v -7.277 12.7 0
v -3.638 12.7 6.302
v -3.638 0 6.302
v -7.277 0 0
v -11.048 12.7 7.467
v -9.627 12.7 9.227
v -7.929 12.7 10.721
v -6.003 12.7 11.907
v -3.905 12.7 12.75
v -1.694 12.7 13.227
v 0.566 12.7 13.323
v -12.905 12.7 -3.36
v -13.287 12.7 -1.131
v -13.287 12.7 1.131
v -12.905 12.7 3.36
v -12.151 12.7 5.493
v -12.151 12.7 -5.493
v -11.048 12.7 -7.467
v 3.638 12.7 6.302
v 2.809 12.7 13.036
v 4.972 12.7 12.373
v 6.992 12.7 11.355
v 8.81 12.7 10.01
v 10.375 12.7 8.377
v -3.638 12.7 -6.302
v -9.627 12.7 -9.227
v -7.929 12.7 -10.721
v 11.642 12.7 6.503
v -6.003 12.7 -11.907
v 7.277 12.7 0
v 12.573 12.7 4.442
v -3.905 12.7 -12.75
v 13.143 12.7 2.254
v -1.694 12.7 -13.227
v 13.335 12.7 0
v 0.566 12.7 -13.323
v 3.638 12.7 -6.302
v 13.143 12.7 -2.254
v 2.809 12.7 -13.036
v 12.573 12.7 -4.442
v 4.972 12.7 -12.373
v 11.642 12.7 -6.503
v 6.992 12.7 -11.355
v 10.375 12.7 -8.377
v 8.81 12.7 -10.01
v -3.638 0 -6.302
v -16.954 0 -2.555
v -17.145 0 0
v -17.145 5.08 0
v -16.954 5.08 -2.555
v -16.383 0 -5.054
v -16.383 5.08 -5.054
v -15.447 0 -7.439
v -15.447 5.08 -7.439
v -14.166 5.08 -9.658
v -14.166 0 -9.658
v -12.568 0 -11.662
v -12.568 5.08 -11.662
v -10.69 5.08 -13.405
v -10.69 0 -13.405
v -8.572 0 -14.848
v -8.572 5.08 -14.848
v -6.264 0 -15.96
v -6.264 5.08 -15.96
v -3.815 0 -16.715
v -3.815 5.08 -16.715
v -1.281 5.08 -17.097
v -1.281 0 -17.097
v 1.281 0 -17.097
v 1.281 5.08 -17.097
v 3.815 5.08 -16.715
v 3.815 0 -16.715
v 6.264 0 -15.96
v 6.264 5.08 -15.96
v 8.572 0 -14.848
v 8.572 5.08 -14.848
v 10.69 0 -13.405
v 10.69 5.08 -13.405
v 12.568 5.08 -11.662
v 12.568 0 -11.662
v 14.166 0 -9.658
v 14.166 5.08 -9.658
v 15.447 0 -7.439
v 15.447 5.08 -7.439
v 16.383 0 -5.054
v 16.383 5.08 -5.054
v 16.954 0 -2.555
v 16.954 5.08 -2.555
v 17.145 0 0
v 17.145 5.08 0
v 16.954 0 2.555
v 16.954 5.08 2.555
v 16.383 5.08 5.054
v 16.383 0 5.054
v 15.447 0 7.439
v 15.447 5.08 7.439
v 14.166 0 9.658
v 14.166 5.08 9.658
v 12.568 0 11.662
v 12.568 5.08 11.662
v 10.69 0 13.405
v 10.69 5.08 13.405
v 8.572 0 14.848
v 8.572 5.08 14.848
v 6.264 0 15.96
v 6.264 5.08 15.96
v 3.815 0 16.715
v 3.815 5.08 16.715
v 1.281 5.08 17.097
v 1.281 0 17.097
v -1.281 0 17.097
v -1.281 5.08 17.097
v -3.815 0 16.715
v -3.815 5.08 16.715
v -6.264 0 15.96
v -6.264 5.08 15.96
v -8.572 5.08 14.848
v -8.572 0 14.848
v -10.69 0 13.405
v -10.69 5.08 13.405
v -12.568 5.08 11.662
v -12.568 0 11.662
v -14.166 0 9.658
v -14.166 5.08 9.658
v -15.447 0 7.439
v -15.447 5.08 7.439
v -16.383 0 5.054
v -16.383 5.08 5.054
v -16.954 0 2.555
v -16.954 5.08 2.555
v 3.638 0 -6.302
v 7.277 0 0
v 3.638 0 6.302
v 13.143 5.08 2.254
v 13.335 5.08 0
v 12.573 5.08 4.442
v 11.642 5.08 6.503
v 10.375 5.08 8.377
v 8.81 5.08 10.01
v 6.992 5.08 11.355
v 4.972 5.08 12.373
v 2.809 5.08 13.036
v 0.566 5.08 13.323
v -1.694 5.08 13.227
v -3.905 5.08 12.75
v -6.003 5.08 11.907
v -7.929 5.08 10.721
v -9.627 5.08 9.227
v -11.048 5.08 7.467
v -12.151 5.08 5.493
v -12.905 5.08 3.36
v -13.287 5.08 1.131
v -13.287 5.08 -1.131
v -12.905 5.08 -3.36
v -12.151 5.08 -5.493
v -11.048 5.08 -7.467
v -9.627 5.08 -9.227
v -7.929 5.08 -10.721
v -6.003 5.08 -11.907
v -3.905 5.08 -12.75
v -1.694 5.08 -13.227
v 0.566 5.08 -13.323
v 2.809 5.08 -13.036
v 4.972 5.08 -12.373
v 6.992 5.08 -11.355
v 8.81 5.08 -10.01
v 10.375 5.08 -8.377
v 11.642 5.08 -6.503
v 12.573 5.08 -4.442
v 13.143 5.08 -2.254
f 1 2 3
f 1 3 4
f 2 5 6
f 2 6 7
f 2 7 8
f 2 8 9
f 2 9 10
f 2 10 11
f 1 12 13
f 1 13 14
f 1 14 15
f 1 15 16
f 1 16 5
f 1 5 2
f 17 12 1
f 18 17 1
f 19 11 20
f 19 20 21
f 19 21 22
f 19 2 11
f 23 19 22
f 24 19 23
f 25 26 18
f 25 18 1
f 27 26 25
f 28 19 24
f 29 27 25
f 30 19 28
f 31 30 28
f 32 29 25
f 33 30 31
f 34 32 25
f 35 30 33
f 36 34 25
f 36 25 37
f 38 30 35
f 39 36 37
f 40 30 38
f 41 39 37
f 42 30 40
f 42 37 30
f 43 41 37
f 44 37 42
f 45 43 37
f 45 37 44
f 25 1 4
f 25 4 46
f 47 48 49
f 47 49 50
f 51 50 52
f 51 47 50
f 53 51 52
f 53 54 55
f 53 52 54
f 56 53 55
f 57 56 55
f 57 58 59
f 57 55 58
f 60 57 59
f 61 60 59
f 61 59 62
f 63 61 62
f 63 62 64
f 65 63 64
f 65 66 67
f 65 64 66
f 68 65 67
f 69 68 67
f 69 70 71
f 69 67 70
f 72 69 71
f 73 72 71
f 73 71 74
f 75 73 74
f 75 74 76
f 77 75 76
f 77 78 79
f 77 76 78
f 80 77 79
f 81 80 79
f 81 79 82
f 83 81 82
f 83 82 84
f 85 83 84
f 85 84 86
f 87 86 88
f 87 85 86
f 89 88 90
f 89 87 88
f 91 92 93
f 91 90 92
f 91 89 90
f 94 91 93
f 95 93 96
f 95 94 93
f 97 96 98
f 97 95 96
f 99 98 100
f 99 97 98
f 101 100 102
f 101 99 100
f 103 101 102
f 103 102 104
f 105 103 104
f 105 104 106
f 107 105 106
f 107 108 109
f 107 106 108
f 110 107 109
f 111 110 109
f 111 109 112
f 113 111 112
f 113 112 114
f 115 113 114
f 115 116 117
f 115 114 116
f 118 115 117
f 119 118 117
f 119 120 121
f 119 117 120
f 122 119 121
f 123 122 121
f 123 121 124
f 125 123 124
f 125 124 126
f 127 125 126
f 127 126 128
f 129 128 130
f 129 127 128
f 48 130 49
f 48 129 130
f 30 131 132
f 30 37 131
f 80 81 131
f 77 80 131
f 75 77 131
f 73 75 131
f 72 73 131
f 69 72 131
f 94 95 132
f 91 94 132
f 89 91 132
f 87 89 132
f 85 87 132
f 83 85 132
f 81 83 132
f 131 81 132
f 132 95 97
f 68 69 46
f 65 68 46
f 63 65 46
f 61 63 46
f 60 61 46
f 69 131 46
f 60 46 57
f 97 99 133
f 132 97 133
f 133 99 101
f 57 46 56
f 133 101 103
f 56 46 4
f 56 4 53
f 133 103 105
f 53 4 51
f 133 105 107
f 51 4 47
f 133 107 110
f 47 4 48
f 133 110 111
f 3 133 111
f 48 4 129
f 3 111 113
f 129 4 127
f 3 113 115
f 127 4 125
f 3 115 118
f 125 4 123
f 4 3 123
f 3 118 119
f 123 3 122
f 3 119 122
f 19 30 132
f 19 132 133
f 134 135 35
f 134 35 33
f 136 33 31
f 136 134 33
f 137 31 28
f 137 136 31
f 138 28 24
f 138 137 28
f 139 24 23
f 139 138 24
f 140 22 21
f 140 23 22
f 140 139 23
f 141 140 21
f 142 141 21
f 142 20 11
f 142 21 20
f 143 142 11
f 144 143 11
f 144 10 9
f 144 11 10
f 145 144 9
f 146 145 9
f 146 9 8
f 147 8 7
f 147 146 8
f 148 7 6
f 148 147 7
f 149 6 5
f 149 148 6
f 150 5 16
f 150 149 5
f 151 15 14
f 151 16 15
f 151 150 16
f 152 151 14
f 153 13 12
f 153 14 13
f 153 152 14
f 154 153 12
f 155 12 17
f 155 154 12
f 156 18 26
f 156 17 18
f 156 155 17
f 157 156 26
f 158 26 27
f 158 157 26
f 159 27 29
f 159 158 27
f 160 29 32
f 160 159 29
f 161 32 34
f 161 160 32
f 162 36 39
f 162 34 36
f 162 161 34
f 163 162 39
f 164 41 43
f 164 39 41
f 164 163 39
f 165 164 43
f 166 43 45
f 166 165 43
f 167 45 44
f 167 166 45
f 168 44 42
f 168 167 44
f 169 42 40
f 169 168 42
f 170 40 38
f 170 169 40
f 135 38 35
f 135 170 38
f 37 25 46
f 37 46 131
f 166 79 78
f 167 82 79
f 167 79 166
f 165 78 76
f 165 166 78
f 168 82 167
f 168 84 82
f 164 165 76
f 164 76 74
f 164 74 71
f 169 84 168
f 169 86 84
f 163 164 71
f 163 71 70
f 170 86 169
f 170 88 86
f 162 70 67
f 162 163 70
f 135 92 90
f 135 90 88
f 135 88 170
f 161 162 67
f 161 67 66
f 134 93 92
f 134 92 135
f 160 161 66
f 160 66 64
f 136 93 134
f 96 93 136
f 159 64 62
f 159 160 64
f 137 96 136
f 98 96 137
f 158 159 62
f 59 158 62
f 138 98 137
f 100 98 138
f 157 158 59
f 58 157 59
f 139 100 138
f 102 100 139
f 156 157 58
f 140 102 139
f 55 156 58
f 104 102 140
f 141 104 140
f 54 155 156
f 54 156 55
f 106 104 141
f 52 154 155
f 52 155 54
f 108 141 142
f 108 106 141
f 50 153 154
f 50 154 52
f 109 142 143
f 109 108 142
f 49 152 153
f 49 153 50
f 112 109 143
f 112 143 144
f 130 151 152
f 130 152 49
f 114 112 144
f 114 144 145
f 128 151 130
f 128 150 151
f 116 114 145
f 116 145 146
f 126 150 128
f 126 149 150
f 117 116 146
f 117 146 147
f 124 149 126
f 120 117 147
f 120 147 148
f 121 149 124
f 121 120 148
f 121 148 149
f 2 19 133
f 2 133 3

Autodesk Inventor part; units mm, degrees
ref_plane "YZ Plane" through (0, 0, 0) normal (1, 0, 0) x (0, 1, 0)
ref_plane "XZ Plane" through (0, 0, 0) normal (0, 1, 0) x (-1, 0, 0)
ref_plane "XY Plane" through (0, 0, 0) normal (0, 0, 1) x (1, 0, 0)
sketch "Sketch1" plane through (0, 0, 0) normal (0, 1, 0) x (-1, 0, 0)
  circle A0 centre (0, 0) radius 17.145
  dimension "d0" = 34.29
extrude "Extrusion1" add sketch "Sketch1" along normal blind 5.08
sketch "Sketch2" plane through (0, 5.08, 0) normal (0, 1, 0) x (1, 0, 0)
  circle A0 centre (0, 0) radius 13.335
  dimension "d3" = 26.67
extrude "Extrusion2" add sketch "Sketch2" along normal blind 7.62
sketch "Sketch3" plane through (0, 12.7, 0) normal (0, 1, 0) x (1, 0, 0)
  line L0 (-3.6383, -6.3018) -> (-7.2767, 0)
  line L1 (-7.2767, 0) -> (-3.6383, 6.3018)
  line L2 (-3.6383, 6.3018) -> (3.6383, 6.3018)
  line L3 (3.6383, 6.3018) -> (7.2767, 0)
  line L4 (7.2767, 0) -> (3.6383, -6.3018)
  line L5 (3.6383, -6.3018) -> (-3.6383, -6.3018)
  point P0 (0, 0)
  point P1 (0, 0)
extrude "Extrusion3" cut sketch "Sketch3" against normal blind 12.7
properties part number "Hex Shaft Holder"
